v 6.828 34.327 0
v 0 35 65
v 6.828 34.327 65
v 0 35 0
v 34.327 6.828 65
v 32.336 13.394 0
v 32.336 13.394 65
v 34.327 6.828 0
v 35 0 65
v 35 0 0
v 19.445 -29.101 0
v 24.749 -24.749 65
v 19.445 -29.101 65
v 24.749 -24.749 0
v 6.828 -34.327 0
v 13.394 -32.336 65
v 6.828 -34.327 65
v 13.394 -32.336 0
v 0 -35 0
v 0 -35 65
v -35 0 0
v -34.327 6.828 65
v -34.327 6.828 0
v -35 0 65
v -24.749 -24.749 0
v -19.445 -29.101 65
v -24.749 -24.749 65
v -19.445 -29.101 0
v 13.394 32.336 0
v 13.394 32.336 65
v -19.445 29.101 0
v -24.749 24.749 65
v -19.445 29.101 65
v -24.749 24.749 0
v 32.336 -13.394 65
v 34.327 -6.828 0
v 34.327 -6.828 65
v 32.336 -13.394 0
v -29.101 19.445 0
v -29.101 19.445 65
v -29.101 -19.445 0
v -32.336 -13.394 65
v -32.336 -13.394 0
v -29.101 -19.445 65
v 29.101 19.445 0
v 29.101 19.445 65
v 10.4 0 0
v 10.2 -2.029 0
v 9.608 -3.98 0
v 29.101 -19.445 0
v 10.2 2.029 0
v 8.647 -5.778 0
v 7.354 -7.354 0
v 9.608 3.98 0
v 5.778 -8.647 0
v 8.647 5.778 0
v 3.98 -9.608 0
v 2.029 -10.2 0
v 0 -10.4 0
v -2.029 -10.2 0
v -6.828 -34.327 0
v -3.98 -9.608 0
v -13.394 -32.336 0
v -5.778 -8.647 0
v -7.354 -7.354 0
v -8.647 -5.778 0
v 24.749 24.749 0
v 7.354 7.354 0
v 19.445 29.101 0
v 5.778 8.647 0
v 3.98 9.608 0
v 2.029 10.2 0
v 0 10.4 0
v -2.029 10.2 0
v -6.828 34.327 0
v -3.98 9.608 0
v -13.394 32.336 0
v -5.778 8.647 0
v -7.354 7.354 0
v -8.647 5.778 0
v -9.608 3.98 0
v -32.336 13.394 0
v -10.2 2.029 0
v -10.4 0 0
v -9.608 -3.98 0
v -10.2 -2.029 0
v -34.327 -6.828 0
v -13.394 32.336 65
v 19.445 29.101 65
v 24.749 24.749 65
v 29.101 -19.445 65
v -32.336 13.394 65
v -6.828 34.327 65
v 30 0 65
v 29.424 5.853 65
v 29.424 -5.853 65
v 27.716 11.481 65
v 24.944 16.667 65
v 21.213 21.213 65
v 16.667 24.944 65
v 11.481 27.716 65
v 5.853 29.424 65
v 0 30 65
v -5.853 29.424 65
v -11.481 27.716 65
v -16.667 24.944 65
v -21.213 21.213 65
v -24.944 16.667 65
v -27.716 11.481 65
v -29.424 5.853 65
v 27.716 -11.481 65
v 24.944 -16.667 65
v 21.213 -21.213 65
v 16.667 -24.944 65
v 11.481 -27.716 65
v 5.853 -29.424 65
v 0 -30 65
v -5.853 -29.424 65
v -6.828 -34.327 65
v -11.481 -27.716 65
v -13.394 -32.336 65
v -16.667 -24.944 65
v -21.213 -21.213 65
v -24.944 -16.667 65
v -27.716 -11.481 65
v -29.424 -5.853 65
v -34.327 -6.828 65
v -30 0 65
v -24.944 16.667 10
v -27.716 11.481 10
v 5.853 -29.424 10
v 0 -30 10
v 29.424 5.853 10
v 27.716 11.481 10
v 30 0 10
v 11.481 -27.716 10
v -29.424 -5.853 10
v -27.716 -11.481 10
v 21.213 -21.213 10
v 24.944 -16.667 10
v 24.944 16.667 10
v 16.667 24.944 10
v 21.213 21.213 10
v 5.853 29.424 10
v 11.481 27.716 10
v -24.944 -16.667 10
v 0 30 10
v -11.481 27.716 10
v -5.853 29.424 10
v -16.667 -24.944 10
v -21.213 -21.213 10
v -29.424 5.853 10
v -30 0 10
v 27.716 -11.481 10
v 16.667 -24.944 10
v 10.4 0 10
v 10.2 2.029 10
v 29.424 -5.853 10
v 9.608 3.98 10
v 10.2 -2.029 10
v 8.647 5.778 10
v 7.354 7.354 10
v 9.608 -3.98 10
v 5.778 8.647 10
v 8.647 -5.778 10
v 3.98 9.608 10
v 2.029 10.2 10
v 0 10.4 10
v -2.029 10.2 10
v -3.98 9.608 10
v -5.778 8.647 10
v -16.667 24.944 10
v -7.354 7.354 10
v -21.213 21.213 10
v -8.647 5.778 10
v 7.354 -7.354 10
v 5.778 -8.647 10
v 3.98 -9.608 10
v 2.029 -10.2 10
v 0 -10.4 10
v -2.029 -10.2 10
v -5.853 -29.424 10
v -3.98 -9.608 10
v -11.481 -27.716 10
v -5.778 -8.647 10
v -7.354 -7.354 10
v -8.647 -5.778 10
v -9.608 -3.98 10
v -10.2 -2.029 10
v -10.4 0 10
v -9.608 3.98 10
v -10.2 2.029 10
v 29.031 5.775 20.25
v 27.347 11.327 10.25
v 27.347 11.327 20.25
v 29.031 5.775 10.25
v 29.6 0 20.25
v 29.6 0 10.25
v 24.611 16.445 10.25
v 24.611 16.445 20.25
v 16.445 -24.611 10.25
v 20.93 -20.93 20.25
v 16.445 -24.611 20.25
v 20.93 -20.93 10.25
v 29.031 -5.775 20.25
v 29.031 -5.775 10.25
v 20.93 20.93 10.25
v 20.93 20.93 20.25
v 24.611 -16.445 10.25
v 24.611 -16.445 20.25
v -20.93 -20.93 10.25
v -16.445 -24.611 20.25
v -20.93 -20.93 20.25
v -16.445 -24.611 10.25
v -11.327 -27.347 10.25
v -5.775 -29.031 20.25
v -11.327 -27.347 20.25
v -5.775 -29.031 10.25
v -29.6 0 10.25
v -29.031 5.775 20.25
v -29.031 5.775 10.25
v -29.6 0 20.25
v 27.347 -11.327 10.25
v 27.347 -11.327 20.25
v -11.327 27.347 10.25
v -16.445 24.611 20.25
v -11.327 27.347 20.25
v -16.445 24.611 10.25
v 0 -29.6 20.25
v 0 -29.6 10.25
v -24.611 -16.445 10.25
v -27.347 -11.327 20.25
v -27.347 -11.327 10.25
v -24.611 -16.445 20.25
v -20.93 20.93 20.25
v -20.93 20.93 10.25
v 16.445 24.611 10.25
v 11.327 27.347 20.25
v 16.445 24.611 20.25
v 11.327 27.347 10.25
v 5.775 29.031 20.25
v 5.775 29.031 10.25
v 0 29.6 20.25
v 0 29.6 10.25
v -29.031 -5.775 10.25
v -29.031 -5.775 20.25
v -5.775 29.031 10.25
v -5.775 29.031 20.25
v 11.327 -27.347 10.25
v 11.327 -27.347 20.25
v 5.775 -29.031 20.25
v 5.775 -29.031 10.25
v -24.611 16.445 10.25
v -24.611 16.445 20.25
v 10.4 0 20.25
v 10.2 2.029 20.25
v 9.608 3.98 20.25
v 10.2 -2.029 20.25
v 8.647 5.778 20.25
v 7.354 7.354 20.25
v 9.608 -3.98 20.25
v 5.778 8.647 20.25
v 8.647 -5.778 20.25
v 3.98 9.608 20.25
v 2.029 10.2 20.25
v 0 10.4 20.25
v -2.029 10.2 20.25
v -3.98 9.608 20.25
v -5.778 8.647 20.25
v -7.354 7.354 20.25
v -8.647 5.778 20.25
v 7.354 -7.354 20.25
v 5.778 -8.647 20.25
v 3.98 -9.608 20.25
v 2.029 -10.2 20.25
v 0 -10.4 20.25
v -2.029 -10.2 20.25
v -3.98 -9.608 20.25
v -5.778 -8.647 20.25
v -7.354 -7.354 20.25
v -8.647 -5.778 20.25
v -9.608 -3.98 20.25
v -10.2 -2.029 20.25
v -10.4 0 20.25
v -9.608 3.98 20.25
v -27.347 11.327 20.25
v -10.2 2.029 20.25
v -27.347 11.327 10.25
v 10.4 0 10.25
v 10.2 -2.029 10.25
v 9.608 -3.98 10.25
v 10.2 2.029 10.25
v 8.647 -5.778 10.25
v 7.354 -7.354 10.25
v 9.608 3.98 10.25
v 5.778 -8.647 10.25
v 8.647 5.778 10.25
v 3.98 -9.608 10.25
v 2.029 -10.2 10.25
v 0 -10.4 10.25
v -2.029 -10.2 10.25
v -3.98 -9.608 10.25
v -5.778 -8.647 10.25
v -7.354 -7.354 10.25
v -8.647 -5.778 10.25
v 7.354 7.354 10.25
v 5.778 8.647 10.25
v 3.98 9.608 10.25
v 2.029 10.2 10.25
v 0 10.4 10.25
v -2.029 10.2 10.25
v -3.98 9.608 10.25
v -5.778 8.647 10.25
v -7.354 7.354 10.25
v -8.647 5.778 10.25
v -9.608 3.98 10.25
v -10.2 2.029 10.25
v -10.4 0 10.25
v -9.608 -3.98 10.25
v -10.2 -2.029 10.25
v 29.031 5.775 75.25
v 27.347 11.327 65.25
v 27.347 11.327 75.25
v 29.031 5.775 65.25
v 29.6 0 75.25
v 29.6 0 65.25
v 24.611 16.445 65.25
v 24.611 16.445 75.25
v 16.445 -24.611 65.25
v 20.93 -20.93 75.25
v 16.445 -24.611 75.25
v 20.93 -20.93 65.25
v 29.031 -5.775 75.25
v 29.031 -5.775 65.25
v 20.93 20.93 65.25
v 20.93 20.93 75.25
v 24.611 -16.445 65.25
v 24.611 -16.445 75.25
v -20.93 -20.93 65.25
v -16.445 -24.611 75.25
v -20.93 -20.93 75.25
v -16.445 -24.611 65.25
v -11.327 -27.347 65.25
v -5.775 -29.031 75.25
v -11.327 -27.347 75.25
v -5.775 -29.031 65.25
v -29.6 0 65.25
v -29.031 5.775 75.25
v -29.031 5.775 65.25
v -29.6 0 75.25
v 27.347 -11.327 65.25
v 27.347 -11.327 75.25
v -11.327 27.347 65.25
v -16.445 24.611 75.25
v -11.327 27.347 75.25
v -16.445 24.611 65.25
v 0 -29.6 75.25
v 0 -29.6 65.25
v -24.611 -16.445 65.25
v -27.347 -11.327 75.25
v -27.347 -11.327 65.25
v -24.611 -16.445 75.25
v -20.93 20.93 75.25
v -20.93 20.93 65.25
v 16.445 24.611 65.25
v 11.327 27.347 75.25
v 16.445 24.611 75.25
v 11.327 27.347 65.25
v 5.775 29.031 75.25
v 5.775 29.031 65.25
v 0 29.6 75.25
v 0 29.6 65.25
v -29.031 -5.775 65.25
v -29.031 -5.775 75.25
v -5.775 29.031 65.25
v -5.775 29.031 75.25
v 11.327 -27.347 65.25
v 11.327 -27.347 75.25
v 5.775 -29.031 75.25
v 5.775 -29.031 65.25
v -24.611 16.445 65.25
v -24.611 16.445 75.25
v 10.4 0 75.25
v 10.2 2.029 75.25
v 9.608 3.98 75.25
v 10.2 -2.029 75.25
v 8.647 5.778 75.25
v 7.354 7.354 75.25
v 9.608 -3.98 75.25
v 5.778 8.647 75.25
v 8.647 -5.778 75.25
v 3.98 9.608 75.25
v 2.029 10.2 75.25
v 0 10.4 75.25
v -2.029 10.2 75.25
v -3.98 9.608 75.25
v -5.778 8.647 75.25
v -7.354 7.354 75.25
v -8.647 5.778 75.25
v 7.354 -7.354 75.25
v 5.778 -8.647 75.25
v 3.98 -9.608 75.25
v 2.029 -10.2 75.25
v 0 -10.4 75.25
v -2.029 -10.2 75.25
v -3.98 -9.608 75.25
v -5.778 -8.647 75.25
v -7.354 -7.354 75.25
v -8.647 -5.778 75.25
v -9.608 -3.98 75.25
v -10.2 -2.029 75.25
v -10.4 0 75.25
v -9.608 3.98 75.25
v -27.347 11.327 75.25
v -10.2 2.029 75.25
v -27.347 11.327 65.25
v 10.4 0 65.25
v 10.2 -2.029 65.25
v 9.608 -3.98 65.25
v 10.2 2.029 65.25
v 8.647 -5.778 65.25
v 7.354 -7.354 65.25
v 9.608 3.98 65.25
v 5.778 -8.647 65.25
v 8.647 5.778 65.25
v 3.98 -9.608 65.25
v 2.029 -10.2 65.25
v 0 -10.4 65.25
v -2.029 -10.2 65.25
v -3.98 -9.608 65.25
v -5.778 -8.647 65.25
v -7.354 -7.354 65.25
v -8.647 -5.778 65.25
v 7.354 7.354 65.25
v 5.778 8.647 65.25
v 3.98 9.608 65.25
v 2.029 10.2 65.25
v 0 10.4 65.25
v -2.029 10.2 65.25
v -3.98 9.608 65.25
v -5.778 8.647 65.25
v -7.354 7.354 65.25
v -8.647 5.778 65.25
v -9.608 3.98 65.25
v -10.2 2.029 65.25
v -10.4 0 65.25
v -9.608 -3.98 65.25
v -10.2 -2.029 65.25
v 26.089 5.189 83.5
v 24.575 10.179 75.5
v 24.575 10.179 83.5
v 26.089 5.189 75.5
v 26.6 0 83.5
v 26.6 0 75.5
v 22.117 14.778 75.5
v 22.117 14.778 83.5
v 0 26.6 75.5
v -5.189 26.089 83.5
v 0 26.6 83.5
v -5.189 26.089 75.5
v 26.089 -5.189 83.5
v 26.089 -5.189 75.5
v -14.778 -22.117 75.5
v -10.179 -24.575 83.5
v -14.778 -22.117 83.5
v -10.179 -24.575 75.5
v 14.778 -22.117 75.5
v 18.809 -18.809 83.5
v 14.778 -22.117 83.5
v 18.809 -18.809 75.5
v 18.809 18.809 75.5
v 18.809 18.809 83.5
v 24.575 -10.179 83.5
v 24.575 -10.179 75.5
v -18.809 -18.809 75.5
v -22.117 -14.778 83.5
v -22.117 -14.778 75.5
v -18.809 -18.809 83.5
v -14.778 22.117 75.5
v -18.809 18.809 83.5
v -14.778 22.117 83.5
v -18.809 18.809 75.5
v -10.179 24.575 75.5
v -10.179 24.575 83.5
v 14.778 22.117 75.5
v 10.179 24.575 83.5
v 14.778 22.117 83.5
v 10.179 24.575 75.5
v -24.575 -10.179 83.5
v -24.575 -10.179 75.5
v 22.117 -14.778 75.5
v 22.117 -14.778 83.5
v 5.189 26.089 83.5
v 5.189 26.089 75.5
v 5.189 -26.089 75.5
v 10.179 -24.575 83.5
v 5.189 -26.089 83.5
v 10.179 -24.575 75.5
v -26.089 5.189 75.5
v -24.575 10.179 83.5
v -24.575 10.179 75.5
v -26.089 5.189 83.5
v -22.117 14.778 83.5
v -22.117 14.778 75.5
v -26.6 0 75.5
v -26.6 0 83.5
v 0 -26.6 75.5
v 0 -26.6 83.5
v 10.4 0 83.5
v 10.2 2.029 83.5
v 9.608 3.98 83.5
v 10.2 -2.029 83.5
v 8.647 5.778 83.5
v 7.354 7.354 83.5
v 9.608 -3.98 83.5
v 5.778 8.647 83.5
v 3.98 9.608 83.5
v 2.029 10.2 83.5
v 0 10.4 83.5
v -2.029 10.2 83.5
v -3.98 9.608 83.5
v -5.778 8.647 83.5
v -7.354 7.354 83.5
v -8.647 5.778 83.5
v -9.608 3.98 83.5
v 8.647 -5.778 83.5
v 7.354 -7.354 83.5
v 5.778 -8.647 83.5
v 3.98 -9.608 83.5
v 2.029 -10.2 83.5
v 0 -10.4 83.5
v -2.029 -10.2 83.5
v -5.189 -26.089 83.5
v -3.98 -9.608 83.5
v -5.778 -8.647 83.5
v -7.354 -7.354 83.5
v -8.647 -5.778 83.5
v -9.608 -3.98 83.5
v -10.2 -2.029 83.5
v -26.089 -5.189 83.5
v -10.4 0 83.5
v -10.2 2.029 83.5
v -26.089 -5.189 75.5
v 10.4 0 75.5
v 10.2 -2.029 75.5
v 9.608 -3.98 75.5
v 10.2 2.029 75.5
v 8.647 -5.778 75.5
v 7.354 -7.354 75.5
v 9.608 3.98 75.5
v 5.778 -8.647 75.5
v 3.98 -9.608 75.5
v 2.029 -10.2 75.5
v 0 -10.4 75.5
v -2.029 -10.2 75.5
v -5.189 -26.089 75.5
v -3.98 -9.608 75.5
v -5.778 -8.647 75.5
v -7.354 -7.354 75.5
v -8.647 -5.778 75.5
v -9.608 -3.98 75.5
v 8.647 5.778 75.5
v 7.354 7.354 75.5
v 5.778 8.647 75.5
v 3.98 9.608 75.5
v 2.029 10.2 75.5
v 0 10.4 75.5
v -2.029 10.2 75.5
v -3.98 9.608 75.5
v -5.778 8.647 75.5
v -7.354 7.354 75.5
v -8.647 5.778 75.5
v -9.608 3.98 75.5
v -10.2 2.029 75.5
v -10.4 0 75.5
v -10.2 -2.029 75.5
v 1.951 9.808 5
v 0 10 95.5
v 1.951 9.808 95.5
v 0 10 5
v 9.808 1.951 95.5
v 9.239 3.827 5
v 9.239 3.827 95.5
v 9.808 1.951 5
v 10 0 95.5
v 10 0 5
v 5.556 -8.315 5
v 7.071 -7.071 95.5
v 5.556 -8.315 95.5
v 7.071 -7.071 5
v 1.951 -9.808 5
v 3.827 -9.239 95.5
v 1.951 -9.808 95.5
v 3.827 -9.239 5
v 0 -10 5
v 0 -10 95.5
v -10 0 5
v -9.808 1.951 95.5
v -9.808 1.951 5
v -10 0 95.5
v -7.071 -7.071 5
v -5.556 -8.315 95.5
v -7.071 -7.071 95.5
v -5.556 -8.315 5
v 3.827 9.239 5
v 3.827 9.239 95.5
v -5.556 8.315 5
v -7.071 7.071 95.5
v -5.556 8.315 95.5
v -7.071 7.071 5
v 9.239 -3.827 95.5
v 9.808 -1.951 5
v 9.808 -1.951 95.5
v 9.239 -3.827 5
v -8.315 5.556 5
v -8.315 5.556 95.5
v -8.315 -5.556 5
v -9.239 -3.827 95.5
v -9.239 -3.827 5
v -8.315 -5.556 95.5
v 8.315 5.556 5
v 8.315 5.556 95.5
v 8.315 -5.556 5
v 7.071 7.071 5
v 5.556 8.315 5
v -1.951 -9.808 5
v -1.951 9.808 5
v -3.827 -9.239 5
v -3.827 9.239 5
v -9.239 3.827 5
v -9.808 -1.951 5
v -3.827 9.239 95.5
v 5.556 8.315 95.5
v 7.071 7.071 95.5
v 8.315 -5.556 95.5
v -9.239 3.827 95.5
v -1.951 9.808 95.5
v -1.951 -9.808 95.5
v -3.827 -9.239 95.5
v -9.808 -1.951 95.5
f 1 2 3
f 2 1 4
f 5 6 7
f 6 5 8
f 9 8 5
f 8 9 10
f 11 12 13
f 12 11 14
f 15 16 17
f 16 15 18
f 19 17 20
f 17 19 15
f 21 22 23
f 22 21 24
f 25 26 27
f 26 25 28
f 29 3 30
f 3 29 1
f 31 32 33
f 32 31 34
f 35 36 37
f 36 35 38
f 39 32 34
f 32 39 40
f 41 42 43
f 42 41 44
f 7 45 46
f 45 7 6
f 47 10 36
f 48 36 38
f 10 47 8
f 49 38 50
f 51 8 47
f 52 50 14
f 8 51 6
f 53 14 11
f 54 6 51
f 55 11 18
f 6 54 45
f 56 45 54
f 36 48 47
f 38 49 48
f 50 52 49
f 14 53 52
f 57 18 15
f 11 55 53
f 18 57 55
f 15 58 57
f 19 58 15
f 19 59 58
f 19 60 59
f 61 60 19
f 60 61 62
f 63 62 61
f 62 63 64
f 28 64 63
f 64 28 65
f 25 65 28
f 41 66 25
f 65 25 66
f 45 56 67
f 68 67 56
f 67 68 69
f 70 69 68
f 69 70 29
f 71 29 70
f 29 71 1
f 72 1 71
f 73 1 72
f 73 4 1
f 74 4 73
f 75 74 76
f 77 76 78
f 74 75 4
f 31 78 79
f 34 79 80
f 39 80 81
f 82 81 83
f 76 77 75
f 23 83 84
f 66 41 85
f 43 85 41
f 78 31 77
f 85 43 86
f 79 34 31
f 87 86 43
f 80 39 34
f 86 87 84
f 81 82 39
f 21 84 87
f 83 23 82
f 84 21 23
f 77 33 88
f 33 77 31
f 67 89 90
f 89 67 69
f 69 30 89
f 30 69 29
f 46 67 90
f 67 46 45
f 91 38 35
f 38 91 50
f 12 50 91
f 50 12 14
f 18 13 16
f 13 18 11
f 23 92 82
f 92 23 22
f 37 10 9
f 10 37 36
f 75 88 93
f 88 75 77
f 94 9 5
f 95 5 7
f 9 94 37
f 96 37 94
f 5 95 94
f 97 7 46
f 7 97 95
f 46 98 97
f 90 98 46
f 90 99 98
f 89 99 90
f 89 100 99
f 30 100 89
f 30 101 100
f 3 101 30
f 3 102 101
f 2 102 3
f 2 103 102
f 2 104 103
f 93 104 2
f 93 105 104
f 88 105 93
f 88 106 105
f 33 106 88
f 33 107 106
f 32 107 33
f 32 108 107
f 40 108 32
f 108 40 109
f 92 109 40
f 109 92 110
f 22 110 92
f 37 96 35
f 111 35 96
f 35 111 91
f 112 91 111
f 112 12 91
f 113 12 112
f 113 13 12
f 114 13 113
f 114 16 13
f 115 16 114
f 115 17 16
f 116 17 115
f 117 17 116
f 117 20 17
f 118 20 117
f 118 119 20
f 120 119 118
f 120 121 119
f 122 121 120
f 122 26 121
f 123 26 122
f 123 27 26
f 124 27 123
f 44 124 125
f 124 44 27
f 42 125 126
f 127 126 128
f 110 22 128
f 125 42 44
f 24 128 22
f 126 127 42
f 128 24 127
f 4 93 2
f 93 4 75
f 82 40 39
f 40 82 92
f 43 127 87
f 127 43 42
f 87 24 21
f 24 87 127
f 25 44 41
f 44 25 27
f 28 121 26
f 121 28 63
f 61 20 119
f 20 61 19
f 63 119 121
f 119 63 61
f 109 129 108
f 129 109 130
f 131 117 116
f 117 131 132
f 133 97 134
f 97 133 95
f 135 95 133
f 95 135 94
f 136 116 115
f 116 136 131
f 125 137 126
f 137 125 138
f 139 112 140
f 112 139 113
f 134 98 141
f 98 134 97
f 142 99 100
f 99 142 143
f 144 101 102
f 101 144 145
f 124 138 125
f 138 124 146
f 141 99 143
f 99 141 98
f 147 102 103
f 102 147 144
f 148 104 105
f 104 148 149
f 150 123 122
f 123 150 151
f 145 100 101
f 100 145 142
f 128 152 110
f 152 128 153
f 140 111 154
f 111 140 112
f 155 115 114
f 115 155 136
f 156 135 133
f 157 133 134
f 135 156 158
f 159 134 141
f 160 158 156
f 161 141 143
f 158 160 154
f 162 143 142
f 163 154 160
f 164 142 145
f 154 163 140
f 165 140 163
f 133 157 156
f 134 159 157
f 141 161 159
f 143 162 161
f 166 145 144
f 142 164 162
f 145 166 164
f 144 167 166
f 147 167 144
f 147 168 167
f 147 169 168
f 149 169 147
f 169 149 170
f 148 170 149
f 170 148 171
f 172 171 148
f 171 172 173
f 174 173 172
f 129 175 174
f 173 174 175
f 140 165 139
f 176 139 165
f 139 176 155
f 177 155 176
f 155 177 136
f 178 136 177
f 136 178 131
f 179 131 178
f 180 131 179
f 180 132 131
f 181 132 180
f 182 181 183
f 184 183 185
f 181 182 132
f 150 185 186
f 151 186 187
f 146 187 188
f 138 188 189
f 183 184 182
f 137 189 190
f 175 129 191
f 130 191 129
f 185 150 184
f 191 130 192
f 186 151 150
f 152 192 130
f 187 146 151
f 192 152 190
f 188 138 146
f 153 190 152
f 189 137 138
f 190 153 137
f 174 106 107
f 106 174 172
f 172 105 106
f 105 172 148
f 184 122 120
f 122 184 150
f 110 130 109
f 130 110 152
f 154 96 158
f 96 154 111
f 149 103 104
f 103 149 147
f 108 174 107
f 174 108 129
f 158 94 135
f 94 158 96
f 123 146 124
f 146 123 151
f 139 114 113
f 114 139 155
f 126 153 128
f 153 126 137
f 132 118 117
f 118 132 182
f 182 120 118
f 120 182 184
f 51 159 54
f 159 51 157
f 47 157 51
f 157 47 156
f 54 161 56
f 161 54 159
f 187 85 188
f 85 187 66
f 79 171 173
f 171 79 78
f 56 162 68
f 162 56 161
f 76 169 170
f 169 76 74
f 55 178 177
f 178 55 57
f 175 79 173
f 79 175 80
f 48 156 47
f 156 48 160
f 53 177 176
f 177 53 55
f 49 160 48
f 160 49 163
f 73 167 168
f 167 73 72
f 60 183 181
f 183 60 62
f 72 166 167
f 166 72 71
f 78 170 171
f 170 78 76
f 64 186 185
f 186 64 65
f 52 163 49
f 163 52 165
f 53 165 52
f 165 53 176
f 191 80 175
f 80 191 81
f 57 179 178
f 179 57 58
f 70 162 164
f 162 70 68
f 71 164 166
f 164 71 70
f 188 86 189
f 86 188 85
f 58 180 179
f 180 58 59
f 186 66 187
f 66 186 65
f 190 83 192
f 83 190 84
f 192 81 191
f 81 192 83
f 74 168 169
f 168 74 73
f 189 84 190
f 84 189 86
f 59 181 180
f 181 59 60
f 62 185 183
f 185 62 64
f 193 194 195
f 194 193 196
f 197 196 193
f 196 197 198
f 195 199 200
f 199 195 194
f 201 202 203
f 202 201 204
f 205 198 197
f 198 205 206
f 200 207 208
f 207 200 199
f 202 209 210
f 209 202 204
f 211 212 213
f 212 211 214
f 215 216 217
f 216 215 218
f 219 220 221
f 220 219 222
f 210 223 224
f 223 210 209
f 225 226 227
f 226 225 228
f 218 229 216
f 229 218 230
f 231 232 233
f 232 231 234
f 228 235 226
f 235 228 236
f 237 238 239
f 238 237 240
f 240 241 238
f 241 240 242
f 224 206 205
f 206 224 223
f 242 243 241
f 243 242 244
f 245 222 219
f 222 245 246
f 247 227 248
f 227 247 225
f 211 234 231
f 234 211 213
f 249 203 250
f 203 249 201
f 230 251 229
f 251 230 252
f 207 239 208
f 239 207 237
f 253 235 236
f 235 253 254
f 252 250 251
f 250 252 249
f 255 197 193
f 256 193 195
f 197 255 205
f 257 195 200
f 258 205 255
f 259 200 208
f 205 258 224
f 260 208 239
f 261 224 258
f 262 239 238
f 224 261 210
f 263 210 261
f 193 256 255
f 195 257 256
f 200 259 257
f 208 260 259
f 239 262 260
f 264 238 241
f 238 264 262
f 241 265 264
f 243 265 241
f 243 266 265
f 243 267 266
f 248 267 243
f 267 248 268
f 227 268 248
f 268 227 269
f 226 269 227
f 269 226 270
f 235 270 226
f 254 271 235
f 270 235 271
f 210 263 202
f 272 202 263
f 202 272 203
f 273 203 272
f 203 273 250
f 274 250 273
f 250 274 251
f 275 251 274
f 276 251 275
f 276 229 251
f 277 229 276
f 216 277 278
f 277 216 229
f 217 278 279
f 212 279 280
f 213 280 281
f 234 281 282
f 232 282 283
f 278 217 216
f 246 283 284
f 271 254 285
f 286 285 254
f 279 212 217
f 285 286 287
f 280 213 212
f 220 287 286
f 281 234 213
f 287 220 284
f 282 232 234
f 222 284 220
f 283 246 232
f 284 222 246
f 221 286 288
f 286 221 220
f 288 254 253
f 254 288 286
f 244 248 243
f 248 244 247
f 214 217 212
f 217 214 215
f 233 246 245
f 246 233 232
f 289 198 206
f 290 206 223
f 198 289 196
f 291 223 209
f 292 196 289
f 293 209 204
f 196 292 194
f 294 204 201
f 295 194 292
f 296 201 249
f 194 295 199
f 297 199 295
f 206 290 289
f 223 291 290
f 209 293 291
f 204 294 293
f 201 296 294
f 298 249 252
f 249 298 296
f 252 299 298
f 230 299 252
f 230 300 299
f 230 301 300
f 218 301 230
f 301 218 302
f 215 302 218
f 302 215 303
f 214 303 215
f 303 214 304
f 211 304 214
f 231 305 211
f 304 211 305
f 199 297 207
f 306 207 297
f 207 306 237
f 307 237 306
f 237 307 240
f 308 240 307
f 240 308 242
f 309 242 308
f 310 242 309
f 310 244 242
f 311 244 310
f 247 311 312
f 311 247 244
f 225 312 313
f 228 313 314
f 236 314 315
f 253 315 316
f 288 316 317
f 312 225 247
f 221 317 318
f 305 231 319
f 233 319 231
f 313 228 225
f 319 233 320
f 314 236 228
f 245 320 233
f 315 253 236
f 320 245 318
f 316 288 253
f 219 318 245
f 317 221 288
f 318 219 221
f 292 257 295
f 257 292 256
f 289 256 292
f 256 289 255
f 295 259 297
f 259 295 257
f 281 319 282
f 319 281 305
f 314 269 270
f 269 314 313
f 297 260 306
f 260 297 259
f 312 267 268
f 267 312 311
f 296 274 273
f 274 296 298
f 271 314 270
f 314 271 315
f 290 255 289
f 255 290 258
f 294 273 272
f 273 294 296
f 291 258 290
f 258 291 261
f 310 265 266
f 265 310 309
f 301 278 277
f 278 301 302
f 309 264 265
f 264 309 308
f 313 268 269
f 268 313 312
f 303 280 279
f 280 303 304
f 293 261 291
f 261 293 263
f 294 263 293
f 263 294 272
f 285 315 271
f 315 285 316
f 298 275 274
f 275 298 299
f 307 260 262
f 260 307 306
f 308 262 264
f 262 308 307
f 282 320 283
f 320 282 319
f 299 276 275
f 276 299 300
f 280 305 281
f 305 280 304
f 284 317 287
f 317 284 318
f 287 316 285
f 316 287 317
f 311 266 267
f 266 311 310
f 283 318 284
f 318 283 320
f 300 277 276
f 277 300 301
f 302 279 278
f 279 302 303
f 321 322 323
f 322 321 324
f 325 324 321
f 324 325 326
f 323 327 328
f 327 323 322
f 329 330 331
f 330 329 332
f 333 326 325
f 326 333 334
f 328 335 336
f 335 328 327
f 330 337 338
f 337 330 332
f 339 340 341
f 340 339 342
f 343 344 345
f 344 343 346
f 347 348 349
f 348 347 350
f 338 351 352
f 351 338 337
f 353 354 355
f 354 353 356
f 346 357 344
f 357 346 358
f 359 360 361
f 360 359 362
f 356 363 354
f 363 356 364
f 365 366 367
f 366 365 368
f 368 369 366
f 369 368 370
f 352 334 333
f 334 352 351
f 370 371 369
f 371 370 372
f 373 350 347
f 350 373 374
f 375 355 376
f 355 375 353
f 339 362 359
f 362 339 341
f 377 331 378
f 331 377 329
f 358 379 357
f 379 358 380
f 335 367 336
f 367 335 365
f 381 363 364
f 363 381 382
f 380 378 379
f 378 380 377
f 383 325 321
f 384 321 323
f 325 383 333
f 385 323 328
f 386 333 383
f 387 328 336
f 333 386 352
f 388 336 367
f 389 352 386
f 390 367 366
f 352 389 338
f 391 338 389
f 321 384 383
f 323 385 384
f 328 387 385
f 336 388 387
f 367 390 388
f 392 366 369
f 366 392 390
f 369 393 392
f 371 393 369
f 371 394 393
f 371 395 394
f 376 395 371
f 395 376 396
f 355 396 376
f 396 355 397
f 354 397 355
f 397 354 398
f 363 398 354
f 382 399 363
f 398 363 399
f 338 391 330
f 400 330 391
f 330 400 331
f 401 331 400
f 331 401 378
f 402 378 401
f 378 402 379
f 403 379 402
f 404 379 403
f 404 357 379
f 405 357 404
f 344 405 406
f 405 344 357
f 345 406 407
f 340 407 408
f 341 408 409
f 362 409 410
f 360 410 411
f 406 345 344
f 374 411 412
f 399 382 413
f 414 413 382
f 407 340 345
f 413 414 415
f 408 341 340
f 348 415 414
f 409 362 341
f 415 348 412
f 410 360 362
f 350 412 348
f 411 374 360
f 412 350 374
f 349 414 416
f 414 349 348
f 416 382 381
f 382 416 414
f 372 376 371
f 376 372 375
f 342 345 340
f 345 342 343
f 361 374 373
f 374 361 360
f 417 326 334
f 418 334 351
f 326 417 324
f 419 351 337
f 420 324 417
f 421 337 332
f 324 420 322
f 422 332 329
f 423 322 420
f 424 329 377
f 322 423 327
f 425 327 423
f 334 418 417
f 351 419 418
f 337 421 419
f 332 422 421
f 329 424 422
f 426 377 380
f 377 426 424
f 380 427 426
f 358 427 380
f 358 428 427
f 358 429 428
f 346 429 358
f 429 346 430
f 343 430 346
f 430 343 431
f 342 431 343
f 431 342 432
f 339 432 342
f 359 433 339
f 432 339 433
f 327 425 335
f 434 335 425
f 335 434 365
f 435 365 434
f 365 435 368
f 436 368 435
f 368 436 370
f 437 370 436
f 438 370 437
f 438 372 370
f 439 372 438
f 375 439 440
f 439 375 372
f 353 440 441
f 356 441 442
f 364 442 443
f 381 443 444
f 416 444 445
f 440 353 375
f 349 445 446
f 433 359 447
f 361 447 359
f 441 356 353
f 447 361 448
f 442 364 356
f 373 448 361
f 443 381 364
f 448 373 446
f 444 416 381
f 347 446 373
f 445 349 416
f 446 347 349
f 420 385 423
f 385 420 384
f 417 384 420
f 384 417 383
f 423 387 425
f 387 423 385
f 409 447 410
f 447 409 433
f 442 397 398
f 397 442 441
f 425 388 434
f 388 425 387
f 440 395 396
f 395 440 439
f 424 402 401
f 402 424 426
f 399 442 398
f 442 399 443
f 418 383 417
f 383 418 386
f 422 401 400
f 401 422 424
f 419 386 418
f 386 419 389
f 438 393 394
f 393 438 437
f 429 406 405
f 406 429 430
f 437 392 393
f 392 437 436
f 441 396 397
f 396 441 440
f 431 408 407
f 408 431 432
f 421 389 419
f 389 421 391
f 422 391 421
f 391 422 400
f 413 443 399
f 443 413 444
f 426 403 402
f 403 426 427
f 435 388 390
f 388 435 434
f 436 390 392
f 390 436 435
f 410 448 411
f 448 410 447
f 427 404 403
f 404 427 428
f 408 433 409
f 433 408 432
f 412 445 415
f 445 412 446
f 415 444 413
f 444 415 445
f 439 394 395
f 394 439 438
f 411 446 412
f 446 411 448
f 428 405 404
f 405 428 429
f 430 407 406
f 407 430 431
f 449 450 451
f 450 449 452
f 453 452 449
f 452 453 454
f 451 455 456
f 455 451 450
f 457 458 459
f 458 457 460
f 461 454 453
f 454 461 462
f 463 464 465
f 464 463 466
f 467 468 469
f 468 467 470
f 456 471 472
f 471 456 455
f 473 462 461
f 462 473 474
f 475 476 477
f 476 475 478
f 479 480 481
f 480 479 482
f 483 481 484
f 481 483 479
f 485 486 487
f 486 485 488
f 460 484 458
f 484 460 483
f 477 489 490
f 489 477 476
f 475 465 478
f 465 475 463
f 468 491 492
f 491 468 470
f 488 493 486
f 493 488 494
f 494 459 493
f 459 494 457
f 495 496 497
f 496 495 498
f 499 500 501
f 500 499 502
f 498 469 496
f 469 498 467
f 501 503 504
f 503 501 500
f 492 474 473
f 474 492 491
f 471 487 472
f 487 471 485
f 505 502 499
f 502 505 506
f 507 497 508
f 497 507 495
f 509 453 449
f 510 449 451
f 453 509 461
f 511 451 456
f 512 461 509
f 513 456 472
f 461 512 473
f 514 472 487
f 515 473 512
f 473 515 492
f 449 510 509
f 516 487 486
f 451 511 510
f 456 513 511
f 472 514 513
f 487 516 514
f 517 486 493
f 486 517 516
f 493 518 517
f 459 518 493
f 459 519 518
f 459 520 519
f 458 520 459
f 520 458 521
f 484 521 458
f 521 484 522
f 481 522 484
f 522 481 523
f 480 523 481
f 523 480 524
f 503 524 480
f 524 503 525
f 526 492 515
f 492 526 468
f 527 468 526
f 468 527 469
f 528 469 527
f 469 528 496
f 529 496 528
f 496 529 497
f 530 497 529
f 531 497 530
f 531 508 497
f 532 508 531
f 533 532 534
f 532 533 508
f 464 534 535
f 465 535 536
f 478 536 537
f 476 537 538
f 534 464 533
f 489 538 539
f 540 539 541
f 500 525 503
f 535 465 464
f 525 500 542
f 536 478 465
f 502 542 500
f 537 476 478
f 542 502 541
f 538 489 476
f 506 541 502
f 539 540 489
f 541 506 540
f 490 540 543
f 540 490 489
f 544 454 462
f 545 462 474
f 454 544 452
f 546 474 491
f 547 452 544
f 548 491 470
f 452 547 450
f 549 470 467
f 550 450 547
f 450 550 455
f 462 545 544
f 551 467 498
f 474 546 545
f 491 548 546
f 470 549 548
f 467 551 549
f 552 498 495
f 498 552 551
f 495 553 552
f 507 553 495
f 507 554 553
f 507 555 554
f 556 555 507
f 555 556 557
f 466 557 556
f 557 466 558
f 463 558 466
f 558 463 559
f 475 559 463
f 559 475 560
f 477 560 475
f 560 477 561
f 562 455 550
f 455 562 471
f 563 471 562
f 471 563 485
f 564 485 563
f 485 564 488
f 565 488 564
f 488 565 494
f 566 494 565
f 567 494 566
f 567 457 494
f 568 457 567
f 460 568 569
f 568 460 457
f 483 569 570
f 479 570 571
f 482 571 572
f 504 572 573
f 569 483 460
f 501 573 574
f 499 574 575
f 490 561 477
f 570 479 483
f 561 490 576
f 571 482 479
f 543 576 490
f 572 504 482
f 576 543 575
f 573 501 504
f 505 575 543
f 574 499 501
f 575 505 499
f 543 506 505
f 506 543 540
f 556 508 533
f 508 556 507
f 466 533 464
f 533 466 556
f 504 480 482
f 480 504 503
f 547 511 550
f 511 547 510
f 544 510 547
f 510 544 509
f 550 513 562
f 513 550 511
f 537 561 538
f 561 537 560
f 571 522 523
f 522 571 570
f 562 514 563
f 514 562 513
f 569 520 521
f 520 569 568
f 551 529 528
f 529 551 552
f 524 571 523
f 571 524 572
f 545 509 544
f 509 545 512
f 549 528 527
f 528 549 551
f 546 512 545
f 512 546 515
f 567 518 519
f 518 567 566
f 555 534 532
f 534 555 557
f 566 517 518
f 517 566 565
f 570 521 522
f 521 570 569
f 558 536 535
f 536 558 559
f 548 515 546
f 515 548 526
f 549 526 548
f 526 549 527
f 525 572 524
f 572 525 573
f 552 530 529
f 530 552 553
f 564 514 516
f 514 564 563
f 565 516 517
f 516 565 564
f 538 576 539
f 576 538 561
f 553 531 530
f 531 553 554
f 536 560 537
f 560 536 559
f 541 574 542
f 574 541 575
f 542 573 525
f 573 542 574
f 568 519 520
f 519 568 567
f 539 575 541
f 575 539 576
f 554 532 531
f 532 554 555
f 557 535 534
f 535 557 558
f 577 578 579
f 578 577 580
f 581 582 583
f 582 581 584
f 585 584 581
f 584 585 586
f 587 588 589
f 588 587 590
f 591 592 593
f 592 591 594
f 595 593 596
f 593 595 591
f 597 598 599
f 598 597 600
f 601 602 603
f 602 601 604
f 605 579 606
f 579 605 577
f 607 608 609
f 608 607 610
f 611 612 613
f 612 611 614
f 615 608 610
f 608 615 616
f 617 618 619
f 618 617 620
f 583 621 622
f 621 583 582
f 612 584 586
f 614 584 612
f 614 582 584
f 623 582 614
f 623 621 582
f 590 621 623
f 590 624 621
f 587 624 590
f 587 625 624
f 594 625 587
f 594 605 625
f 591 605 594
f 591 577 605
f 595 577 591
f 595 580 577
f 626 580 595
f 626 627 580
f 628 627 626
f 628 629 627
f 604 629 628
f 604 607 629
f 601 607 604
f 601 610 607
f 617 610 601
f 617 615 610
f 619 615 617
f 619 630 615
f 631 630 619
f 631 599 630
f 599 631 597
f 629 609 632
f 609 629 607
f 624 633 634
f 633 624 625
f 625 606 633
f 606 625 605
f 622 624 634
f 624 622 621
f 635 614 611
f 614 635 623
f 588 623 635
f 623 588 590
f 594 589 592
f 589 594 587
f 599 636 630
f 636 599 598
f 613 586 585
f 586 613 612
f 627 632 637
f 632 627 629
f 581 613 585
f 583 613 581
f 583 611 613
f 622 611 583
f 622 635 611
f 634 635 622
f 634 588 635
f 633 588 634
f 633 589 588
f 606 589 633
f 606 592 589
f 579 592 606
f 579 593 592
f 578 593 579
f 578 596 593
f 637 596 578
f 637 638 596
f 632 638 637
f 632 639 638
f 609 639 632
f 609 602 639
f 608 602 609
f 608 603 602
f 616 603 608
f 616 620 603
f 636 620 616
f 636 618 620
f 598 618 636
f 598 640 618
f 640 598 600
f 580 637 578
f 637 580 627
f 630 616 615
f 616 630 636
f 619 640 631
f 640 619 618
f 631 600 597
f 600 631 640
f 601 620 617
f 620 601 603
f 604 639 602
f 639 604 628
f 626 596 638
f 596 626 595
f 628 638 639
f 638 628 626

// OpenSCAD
$fn = 32;

// ------------------------------------------------------------------------
// Bearing housing: housing d70, two bearings and a shaft
// Every part is its own module, assembly() places them once.
// ------------------------------------------------------------------------

// --- part 1 ---
module housing() {
  difference() {
    cylinder(h = 65, d = 70);
    translate([0, 0, 10]) cylinder(h = 56, d = 60);
    translate([0, 0, -1]) cylinder(h = 12, d = 20.8);
  }
}

// --- part 2 ---
module bearing_lower() {
  difference() {
      translate([0, 0, 0]) cylinder(h = 10, d = 59.2);
      translate([0, 0, -1]) cylinder(h = 12, d = 20.8);
    }
}

// --- part 3 ---
module bearing_upper() {
  difference() {
      translate([0, 0, 0]) cylinder(h = 10, d = 59.2);
      translate([0, 0, -1]) cylinder(h = 12, d = 20.8);
    }
}

// --- part 4 ---
module spacer() {
  difference() {
      translate([0, 0, 0]) cylinder(h = 8, d = 53.2);
      translate([0, 0, -1]) cylinder(h = 10, d = 20.8);
    }
}

// --- part 5 ---
module shaft() {
  translate([0, 0, -45.25]) cylinder(h = 90.5, d = 20);
}

// --- assembly ---
module assembly() {
  translate([0, 0, 0]) rotate([0, 0, 0]) housing();
  translate([0, 0, 10.25]) rotate([0, 0, 0]) bearing_lower();
  translate([0, 0, 65.25]) rotate([0, 0, 0]) bearing_upper();
  translate([0, 0, 75.5]) rotate([0, 0, 0]) spacer();
  translate([0, 0, 50.25]) rotate([0, 0, 0]) shaft();
}

assembly();
